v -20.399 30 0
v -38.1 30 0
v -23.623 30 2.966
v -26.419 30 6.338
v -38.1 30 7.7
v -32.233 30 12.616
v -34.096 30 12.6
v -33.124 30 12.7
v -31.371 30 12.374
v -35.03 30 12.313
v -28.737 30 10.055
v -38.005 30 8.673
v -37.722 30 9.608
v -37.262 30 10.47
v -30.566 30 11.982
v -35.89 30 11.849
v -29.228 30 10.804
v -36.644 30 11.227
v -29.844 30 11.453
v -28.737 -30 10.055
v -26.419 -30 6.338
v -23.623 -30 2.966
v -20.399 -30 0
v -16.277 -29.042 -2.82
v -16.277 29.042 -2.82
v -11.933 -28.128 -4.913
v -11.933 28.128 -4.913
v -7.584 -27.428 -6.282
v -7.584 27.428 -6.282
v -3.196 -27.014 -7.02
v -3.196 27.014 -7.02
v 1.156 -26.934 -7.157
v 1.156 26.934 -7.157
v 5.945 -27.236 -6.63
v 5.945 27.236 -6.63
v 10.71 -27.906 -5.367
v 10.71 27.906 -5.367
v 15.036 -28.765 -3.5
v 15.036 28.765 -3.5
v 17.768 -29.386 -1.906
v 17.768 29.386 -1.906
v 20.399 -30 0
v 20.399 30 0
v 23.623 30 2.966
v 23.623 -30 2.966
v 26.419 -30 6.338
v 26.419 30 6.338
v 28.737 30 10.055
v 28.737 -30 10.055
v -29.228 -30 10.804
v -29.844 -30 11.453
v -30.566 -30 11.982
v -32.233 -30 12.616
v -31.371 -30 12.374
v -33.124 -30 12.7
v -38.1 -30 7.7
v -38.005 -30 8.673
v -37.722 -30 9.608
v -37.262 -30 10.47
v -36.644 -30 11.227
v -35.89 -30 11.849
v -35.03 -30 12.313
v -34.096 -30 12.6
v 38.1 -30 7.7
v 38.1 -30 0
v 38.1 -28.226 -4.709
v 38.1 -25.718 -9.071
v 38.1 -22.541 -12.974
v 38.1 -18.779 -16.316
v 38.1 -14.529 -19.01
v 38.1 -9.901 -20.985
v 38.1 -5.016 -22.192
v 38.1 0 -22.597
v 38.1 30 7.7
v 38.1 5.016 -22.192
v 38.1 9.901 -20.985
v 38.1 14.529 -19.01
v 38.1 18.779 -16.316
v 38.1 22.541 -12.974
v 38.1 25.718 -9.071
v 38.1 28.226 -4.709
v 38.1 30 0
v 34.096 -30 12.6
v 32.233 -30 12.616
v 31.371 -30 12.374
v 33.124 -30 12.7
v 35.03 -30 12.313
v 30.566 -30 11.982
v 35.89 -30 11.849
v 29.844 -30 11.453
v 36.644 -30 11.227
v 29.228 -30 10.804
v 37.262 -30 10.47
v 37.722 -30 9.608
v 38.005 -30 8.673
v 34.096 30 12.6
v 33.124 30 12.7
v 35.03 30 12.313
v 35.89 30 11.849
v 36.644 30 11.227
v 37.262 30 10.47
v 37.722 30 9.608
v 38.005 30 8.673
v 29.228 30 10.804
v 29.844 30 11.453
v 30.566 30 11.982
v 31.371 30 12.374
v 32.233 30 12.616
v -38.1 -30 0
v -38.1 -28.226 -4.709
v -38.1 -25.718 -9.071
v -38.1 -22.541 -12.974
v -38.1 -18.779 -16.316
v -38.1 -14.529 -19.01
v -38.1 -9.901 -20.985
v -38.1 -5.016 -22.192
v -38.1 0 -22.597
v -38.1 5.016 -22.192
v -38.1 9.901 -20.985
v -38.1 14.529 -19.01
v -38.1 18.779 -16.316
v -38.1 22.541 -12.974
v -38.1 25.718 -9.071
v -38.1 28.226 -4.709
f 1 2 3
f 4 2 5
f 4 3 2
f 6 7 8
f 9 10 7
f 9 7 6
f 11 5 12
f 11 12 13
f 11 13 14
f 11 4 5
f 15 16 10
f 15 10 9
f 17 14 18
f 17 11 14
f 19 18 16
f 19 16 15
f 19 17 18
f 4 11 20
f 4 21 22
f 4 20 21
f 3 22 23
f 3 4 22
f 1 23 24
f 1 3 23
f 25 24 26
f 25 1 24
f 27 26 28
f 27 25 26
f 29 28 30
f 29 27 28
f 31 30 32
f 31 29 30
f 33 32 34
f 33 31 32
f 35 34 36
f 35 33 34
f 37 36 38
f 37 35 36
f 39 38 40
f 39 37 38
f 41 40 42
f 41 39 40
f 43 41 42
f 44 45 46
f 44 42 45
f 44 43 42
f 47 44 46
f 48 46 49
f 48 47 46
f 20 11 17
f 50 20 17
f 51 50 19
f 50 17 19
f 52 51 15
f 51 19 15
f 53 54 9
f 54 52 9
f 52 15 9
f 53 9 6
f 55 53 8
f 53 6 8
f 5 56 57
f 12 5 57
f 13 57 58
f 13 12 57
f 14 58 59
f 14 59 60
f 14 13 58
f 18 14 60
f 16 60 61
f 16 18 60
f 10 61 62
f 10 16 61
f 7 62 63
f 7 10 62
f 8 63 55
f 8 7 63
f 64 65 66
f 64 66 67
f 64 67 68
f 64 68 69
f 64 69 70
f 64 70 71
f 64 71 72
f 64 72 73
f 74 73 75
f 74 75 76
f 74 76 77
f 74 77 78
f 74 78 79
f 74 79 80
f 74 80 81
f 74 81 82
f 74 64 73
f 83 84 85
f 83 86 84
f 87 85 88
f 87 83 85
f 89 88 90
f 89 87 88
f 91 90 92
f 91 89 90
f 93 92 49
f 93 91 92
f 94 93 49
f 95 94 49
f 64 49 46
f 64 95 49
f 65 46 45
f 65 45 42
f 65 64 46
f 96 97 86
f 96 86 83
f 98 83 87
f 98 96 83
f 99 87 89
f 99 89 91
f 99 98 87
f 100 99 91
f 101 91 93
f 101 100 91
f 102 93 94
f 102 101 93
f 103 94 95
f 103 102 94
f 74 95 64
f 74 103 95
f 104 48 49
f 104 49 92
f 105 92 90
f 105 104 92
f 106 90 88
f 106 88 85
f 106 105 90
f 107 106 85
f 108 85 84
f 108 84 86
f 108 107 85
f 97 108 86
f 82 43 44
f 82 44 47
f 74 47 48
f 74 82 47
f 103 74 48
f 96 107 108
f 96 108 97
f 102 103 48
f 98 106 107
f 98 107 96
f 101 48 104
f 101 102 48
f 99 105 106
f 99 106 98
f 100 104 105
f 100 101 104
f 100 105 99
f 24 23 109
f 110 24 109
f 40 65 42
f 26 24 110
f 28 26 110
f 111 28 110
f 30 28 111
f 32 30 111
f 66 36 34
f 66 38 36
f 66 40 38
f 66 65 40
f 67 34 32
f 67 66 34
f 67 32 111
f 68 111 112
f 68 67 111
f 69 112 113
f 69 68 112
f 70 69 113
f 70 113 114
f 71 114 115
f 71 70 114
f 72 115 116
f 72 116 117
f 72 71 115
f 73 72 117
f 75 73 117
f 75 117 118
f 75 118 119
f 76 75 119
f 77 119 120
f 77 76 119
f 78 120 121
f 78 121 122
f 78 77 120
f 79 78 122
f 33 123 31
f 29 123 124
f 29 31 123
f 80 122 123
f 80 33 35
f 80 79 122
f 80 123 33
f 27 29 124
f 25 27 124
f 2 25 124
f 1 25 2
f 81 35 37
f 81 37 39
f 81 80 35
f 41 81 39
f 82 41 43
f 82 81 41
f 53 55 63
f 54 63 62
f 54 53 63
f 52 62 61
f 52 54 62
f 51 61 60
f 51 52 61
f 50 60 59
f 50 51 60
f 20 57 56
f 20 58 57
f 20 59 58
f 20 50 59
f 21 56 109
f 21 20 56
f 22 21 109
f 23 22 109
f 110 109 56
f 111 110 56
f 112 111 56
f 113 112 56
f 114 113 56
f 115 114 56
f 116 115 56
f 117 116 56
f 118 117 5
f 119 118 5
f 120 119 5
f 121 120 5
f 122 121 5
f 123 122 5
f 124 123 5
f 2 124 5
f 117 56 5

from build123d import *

# Parameters (mm, degrees)
F1_DEPTH      = 38.1
F1_DEPTH_BACK = 38.1
F3_DEPTH      = 30.48
F3_DEPTH_BACK = 30.48
F4_T1_DEPTH   = 85
F4_T3_DEPTH   = 75.73883536


# Not quite as in the source:
# - a fillet or chamfer that OpenCascade refuses, or shapes differently, is made with other operations: its cross-section is extruded or revolved along the edge and cut away or added


with BuildPart() as f1:
    # F0 (on Right) → F1 (new body, two sides)
    with BuildSketch(Plane.YZ) as f1_sk:
        with BuildLine():
            Line((-30, 12.7), (-30, 0))
            ThreePointArc((-30, 0), (0, -22.5972709807), (30, 0))
            Line((30, 0), (30, 12.7))
            Line((30, 12.7), (-30, 12.7))
        make_face()
    extrude(amount=F1_DEPTH)
    extrude(f1_sk.sketch, amount=-F1_DEPTH_BACK)

    # F2 (on Front) → F3 (cut, two sides)
    with BuildSketch(Plane.XZ) as f3_sk:
        with BuildLine():
            Line((30, 12.7), (-30, 12.7))
            ThreePointArc((-30, 12.7), (0, -7.177446186), (30, 12.7))
        make_face()
    extrude(amount=-F3_DEPTH, mode=Mode.SUBTRACT)
    extrude(f3_sk.sketch, amount=F3_DEPTH_BACK, mode=Mode.SUBTRACT)

    # F4: fillet of radius 5 on 4 edges, made by hand

    # F4_s2 → F4_t1 (cut)
    with BuildSketch(Plane.XZ.offset(-42.5)):
        with BuildLine():
            ThreePointArc((-38.1, 7.7), (-36.6355339059, 11.2355339059), (-33.1, 12.7))
            Line((-33.1, 12.7), (-38.1, 12.7))
            Line((-38.1, 12.7), (-38.1, 7.7))
        make_face()
        with BuildLine():
            ThreePointArc((33.1, 12.7), (36.6355339059, 11.2355339059), (38.1, 7.7))
            Line((38.1, 7.7), (38.1, 12.7))
            Line((38.1, 12.7), (33.1, 12.7))
        make_face()
    extrude(amount=F4_T1_DEPTH, mode=Mode.SUBTRACT)

    # F4_s4 → F4_t3 (cut)
    with BuildSketch(Plane.XZ.offset(-37.86941768)):
        with BuildLine():
            ThreePointArc((-28.7371736927, 10.0551360984), (-30.5763550564, 11.988104505), (-33.147767072, 12.7))
            Line((-33.147767072, 12.7), (-30, 12.7))
            ThreePointArc((-30, 12.7), (-29.3983455251, 11.3633593626), (-28.7371736927, 10.0551360984))
        make_face()
        with BuildLine():
            ThreePointArc((28.7371736927, 10.0551360984), (30.5763550564, 11.988104505), (33.147767072, 12.7))
            Line((33.147767072, 12.7), (30, 12.7))
            ThreePointArc((30, 12.7), (29.3983455251, 11.3633593626), (28.7371736927, 10.0551360984))
        make_face()
    extrude(amount=F4_T3_DEPTH, mode=Mode.SUBTRACT)


solid = f1.part
